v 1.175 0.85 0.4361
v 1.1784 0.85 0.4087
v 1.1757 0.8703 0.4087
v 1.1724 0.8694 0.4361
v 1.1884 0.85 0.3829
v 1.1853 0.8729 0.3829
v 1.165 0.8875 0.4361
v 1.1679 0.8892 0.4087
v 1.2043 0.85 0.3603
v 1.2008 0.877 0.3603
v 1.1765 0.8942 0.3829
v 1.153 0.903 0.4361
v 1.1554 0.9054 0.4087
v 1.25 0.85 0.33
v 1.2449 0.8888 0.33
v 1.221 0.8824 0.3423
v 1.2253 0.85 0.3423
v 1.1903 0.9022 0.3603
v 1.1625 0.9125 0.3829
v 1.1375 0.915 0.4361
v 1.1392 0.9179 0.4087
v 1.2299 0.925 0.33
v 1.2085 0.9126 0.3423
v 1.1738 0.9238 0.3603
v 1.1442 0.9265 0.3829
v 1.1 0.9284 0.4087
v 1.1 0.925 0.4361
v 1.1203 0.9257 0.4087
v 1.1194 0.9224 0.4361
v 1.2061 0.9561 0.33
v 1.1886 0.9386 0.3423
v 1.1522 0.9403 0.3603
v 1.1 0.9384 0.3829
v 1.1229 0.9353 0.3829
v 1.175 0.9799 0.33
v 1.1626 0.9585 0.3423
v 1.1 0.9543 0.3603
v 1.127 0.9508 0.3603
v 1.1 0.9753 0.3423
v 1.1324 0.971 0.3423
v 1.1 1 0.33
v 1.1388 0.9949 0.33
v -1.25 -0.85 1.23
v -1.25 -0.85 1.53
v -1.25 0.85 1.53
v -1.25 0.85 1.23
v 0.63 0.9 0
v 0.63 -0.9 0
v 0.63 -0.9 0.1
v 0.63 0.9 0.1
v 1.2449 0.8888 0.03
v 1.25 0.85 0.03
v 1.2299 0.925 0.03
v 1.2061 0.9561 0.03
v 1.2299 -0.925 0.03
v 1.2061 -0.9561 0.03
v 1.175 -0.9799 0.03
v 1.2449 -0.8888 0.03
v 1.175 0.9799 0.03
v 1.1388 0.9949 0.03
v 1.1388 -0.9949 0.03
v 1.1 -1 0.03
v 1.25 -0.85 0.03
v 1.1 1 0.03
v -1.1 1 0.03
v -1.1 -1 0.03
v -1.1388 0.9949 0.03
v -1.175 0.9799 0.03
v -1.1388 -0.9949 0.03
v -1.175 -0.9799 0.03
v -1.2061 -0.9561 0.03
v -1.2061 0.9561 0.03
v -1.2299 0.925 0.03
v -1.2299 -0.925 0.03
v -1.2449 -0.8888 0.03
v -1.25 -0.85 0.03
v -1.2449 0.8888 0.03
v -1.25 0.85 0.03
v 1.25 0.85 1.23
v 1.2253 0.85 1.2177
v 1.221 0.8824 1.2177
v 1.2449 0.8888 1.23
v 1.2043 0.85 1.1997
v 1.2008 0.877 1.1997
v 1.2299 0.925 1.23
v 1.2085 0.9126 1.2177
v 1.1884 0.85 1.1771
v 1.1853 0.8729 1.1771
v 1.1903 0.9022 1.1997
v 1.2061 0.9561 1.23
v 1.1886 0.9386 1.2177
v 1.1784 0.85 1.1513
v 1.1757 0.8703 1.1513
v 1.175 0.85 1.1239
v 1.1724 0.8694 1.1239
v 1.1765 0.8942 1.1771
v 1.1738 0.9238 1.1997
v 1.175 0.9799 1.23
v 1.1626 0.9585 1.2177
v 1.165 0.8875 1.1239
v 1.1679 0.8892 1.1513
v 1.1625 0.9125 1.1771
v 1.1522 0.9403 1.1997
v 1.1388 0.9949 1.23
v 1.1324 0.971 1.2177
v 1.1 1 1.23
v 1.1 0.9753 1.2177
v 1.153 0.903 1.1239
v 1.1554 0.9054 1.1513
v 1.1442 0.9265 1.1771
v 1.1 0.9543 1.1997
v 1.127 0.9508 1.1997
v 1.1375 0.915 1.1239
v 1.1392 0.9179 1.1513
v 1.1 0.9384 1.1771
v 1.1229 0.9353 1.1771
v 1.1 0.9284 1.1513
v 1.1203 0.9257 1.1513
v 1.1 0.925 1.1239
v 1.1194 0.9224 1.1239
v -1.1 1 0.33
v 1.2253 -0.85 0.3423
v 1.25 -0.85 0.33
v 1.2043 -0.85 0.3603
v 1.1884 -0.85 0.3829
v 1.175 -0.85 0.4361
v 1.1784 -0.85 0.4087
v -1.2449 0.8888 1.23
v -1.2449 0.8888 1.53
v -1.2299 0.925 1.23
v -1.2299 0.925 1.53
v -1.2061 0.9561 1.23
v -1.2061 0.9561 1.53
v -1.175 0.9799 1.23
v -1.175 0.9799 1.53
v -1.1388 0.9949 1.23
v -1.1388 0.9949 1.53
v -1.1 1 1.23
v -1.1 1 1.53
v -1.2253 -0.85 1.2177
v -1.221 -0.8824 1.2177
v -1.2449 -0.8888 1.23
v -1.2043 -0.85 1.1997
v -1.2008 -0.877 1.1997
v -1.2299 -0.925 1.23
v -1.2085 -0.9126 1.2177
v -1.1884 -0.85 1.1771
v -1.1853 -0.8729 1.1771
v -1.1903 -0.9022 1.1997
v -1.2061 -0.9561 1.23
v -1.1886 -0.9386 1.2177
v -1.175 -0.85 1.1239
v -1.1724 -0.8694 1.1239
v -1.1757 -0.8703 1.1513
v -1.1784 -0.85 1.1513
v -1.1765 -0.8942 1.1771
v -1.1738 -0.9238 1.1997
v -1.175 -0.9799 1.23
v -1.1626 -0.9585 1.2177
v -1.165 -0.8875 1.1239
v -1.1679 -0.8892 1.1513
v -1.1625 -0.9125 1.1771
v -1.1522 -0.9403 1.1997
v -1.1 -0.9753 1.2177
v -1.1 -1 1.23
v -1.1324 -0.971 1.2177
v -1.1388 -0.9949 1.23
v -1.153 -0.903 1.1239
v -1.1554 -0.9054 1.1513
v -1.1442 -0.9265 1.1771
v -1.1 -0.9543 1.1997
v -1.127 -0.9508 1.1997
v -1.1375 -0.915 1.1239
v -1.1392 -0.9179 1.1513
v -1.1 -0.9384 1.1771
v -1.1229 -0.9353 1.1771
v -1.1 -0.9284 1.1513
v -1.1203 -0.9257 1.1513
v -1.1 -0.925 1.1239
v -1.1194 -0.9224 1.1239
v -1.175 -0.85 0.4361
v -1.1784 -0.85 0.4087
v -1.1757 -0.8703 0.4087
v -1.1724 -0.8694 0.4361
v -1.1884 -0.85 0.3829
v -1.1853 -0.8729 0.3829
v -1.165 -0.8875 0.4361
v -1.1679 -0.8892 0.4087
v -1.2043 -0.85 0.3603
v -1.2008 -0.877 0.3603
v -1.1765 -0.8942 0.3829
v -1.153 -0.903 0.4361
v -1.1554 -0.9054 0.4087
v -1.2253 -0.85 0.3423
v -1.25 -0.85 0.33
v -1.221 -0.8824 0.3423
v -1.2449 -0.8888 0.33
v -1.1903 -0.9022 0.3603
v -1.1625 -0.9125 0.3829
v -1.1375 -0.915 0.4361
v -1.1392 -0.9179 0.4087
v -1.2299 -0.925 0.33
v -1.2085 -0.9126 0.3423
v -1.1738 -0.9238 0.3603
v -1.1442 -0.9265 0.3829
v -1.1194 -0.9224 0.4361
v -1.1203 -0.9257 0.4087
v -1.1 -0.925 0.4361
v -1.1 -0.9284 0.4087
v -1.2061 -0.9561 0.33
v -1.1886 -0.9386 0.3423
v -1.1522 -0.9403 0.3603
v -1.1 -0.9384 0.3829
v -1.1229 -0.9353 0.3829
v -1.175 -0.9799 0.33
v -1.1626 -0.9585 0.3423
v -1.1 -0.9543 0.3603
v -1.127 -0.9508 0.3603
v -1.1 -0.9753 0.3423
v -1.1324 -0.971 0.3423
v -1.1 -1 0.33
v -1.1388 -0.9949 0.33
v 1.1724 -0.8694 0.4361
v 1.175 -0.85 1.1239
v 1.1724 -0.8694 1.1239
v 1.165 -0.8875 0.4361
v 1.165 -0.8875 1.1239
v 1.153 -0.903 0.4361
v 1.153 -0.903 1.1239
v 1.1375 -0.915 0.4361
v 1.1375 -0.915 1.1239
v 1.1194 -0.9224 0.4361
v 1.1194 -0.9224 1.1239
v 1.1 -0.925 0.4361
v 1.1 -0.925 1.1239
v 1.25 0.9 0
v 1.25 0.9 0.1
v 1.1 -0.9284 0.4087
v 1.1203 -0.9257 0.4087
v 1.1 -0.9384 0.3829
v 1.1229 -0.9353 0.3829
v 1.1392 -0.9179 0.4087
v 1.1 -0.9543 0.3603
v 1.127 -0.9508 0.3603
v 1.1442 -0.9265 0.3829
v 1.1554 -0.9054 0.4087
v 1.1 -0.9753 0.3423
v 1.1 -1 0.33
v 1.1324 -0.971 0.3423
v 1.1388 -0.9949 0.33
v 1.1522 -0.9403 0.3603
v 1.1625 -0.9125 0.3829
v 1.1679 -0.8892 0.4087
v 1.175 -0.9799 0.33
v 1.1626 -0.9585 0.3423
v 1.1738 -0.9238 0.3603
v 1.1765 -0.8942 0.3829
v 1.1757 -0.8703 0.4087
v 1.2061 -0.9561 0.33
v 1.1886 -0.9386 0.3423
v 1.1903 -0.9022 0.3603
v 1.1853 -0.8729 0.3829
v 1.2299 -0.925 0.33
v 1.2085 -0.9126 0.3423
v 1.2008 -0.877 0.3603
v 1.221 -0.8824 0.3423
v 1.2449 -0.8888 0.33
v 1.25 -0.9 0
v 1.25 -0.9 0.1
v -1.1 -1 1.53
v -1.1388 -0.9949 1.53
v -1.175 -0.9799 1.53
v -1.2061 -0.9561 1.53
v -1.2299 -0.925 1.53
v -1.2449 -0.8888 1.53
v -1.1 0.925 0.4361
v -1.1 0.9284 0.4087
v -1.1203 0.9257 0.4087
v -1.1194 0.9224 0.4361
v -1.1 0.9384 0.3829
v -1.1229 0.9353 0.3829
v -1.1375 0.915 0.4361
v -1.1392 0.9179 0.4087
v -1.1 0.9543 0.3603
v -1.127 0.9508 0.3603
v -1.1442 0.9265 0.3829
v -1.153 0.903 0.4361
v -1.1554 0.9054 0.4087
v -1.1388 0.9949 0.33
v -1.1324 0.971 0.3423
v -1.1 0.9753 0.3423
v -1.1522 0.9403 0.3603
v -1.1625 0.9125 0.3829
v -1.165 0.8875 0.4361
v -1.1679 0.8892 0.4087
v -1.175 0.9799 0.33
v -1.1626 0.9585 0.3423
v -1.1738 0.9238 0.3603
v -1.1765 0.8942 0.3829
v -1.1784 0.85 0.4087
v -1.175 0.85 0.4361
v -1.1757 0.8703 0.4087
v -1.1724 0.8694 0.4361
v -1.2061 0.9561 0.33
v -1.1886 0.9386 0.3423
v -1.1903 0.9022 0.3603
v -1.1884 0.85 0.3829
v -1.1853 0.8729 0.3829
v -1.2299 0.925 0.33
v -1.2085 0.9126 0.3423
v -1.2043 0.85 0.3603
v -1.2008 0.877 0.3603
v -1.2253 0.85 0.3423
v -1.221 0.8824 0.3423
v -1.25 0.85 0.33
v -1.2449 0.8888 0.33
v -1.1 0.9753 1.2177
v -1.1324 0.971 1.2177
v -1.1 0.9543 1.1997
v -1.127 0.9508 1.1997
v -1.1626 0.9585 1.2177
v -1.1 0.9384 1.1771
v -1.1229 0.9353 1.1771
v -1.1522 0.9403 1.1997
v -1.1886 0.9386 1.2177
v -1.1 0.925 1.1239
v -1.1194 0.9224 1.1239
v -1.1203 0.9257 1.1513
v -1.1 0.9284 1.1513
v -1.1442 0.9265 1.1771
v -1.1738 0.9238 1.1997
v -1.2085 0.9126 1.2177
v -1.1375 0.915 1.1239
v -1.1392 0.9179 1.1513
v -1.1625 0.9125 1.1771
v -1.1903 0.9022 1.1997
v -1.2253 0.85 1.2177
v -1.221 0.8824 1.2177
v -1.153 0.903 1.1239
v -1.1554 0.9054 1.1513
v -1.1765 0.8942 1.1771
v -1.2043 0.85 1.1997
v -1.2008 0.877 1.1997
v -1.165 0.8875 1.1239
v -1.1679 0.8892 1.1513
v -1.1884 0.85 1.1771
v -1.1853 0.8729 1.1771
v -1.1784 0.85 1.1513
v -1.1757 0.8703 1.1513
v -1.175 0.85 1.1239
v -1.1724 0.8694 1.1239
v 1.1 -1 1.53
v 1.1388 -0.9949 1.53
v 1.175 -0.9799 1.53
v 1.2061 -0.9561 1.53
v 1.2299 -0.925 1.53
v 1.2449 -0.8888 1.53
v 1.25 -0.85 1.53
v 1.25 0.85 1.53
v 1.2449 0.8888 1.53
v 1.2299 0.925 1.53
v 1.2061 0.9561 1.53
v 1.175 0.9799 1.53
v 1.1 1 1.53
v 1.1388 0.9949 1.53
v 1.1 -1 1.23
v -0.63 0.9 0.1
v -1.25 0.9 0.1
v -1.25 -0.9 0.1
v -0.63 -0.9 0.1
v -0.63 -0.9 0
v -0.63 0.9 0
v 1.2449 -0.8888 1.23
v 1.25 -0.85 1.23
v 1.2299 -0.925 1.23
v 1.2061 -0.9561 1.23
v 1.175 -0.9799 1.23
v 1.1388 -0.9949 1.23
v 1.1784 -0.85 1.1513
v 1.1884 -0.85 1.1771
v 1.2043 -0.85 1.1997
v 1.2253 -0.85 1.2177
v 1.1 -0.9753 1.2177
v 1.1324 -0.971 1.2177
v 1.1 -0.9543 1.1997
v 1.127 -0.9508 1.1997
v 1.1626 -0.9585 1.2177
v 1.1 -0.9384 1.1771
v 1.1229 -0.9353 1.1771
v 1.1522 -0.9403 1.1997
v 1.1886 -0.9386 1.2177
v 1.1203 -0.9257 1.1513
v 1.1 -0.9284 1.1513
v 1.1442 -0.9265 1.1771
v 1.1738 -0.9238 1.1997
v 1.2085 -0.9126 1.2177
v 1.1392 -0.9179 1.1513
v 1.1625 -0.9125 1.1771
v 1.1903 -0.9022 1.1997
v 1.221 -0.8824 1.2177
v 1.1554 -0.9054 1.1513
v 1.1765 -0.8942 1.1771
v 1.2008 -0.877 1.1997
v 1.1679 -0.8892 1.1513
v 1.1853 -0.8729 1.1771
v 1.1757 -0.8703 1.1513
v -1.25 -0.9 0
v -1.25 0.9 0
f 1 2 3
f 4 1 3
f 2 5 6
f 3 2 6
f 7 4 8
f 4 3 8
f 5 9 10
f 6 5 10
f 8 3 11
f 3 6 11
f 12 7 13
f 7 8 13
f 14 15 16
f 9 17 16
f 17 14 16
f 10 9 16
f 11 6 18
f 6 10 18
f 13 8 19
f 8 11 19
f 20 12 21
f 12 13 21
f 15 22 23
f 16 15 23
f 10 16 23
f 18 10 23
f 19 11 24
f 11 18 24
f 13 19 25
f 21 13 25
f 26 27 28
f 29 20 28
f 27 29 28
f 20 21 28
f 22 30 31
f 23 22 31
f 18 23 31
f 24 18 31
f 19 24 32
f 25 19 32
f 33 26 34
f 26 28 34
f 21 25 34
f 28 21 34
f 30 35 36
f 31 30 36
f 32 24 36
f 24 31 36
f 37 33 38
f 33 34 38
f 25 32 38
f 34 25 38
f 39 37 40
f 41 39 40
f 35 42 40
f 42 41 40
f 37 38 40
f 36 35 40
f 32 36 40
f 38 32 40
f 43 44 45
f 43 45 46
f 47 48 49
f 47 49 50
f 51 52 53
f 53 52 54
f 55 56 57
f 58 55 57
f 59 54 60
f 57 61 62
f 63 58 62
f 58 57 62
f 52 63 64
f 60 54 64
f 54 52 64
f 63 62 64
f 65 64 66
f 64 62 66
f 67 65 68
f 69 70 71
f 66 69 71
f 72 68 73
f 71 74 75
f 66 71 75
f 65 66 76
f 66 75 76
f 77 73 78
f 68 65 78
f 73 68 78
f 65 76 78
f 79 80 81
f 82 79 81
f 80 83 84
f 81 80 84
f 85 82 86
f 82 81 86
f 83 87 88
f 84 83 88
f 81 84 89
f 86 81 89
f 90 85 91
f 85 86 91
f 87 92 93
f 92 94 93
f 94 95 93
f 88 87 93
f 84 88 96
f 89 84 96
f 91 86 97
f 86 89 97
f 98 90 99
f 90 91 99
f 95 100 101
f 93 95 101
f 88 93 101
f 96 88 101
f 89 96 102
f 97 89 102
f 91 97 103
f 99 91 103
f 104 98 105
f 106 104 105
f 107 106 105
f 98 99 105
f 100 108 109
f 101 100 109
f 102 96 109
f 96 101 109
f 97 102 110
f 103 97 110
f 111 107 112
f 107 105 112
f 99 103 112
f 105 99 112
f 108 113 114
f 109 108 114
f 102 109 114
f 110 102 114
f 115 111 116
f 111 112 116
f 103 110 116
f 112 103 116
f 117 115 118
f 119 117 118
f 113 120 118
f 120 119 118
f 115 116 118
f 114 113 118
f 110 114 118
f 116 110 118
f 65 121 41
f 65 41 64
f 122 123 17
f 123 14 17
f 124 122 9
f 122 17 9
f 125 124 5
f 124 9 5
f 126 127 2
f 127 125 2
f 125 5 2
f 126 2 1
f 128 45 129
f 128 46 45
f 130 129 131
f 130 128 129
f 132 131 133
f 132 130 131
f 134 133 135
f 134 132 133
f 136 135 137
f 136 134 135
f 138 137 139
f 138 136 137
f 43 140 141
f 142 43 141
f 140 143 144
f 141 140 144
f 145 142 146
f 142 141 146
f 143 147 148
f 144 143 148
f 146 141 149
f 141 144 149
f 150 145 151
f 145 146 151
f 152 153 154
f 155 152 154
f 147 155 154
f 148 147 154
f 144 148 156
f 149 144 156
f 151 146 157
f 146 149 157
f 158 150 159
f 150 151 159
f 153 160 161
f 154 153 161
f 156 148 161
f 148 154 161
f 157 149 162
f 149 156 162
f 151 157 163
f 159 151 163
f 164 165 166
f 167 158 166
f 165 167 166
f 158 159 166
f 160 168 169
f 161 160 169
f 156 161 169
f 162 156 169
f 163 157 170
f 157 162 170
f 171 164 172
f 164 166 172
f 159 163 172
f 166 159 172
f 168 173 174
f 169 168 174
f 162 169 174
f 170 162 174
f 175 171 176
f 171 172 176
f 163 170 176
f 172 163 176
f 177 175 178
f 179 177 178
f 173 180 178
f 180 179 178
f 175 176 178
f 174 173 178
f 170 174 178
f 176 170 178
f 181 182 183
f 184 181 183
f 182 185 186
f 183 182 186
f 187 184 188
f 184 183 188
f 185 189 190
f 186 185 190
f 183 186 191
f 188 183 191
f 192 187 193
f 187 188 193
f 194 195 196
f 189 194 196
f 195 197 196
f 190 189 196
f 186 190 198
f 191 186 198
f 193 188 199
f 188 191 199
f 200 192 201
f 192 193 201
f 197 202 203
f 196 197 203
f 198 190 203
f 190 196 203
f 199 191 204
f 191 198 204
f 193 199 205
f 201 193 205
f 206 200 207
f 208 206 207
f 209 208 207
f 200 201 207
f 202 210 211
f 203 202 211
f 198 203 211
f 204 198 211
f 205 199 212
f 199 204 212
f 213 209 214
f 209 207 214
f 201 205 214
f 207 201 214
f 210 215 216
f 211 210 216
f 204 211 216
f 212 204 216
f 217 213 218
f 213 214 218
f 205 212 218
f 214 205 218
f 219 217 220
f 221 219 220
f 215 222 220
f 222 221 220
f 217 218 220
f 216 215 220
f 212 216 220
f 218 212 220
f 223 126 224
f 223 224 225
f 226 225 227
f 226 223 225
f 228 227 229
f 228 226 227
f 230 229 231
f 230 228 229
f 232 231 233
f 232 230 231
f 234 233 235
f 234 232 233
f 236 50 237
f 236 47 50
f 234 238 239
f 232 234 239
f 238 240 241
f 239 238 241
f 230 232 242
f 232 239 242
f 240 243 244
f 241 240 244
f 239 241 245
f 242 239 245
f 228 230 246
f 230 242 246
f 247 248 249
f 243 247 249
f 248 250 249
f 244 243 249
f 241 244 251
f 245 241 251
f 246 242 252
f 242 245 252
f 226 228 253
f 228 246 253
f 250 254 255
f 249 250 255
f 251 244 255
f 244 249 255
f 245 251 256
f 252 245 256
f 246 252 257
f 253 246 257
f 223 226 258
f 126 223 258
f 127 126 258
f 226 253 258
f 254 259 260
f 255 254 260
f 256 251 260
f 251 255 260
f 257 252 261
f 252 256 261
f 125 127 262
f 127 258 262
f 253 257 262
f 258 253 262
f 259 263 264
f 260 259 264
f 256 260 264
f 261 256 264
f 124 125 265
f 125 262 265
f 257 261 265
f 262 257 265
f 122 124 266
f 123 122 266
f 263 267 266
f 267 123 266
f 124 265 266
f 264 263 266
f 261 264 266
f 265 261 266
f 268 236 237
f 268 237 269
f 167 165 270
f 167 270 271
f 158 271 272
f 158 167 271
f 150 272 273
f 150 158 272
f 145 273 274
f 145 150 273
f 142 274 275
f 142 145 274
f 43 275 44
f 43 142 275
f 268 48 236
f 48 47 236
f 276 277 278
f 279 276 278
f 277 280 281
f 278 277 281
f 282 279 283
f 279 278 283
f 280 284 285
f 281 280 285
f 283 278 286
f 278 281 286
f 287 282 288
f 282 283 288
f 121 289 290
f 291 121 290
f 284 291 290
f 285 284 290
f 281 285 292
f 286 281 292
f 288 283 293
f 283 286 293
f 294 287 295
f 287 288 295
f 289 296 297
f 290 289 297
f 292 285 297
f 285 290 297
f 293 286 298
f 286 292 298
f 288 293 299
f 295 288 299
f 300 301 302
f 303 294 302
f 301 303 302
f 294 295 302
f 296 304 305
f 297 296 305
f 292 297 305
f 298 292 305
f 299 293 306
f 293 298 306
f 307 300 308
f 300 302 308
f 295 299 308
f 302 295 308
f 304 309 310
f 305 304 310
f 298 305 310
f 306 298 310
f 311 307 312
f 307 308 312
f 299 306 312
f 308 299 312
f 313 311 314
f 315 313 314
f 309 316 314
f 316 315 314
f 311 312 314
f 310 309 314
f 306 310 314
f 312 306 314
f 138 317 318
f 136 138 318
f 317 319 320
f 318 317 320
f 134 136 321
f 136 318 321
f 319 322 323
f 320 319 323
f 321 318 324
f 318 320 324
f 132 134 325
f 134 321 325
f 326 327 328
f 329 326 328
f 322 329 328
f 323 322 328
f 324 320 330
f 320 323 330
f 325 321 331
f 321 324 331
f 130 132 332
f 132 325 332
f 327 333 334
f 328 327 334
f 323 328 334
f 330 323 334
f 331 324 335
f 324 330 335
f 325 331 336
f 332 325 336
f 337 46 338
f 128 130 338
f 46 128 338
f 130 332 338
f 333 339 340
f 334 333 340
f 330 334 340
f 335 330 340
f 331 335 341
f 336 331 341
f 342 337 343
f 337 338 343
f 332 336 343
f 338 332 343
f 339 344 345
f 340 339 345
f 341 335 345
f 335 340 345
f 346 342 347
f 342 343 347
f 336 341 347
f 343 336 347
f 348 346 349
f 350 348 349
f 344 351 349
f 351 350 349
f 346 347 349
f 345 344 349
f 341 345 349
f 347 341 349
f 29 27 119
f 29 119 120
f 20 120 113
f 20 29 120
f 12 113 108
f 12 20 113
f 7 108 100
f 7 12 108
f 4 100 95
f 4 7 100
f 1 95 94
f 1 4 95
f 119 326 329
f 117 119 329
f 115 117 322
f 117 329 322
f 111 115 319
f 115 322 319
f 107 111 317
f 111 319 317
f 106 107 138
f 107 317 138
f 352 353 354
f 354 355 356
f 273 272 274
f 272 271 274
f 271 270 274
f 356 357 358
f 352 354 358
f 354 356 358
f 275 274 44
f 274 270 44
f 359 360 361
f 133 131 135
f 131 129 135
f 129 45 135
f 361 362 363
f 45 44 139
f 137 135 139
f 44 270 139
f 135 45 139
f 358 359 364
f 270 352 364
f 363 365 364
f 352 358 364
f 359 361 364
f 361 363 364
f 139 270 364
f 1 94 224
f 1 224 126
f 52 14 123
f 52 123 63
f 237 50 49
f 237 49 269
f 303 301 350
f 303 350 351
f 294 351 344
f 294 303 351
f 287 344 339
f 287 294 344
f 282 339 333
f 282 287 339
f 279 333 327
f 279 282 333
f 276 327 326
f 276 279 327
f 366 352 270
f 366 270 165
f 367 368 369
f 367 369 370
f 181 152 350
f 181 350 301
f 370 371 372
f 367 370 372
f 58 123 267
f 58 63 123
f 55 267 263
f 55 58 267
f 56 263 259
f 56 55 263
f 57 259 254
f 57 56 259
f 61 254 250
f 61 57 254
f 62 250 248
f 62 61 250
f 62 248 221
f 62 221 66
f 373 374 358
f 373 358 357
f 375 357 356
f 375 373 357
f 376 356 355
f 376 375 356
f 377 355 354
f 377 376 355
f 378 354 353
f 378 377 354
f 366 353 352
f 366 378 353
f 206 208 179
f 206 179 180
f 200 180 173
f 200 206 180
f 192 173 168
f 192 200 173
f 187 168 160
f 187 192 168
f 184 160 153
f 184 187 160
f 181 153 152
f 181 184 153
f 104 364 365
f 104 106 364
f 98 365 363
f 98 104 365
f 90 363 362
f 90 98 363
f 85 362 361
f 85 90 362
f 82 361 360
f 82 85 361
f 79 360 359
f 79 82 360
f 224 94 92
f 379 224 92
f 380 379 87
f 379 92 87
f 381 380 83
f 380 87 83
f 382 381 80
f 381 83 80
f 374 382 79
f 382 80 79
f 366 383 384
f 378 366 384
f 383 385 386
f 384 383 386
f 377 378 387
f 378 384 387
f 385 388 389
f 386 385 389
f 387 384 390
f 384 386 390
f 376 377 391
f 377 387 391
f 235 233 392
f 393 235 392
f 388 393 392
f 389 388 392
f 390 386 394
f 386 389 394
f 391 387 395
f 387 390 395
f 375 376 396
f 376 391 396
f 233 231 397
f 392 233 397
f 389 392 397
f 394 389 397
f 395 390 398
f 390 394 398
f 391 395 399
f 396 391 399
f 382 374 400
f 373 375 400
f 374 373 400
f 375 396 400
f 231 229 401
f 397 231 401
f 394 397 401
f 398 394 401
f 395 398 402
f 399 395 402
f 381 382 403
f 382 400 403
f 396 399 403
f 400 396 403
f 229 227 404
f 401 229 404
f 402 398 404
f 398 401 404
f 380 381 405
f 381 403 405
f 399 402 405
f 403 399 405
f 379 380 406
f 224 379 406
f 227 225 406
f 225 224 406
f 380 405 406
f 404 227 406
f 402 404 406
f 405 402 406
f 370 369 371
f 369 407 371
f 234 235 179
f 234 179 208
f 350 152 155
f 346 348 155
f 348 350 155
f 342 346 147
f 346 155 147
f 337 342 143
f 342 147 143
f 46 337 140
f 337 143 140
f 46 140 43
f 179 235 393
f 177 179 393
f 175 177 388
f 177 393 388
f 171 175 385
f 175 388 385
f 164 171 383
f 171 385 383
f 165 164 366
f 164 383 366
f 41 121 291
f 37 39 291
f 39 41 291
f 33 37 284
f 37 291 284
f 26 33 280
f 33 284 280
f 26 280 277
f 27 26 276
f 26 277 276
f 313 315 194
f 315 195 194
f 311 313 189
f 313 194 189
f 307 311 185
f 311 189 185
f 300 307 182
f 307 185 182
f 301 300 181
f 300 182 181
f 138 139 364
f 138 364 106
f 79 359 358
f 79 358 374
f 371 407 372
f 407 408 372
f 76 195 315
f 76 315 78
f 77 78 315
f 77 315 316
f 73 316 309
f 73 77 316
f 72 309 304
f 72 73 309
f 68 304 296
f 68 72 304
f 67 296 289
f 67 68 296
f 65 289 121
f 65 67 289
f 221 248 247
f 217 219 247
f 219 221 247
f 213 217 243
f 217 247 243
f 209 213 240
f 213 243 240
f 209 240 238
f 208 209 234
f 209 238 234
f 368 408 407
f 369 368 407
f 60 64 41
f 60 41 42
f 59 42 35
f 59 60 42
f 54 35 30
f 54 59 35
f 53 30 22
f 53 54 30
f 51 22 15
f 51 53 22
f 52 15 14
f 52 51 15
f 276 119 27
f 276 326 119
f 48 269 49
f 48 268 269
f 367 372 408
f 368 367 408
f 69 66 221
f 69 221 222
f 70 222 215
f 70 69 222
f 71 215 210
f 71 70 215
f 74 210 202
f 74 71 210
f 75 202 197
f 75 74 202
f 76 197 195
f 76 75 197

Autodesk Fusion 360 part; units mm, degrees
ref_plane "WorkPlane3" through (0, 0, 0.03) normal (0, 0, 1) x (1, 0, 0)
sketch "Sketch1" plane through (0, 0, 0.03) normal (0, 0, 1) x (1, 0, 0)
  line L0 (1.1, 1) -> (-1.1, 1)
  line L1 (-1.25, 0.85) -> (-1.25, -0.85)
  line L2 (-1.1, -1) -> (1.1, -1)
  line L3 (1.25, -0.85) -> (1.25, 0.85)
  line L4 (1.25, 1) -> (-1.25, -1) construction
  line L5 (-1.25, 1) -> (1.25, -1) construction
  line L6 (0, 1) -> (0, -1) construction
  arc A0 (-1.25, -0.85) -> (-1.1, -1) centre (-1.1, -0.85) ccw
  arc A1 (1.1, -1) -> (1.25, -0.85) centre (1.1, -0.85) ccw
  arc A2 (1.25, 0.85) -> (1.1, 1) centre (1.1, 0.85) ccw
  arc A3 (-1.1, 1) -> (-1.25, 0.85) centre (-1.1, 0.85) ccw
  point P0 (1.05, 0)
  dimension "d10" = 2.5
  dimension "d11" = 2
  dimension "d30" = 0.15
ref_plane "WorkPlane2" through (1.1, 0, 0) normal (1, 0, 0) x (0, 1, 0)
sketch "Sketch2" plane through (1.1, 0, 0) normal (1, 0, 0) x (0, 1, 0)
  line L0 (0, 0.03) -> (0, 1.53)
  line L1 (0, 1.53) -> (-1, 1.53)
  line L2 (-1, 1.53) -> (-1, 1.23)
  arc A0 (-0.925, 1.1239) -> (-1, 1.23) centre (-1.0375, 1.1239) ccw
  line L3 (-0.925, 1.1239) -> (-0.925, 0.4361)
  line L4 (-1, 0.03) -> (-1, 0.33)
  arc A1 (-1, 0.33) -> (-0.925, 0.4361) centre (-1.0375, 0.4361) ccw
  line L5 (-0.85, 1.53) -> (-0.85, 0.03)
  line L6 (0, 0.03) -> (-1, 0.03)
  point P0 (-0.85, 0.03)
  dimension "d22" = 0.075
  dimension "d23" = 0.3
  dimension "d24" = 0.3
  dimension "d26" = 0.1125
  dimension "d44" = 1.5
  dimension "d45" = 1
sweep "Sweep1" add profiles "Sketch2" path "Sketch1" along A2 L0 A3 L1 A0 L2 A1 L3 section 1 contours L1 L2 A0 L3 L4 A1 L5 L6 makes body 1
sketch "Sketch3" plane through (0, 0, 1.53) normal (0, 0, 1) x (-1, 0, 0)
  line L0 (-1.1, 0.85) -> (1.1, 0.85)
  line L1 (1.1, 0.85) -> (1.1, -0.85)
  line L2 (1.1, -0.85) -> (-1.1, -0.85)
  line L3 (-1.1, -0.85) -> (-1.1, 0.85)
  arc A0 (-1.1, 1) -> (-1.25, 0.85) centre (-1.1, 0.85) ccw
  line L4 (-1.25, 0.85) -> (-1.25, -0.85)
  arc A1 (-1.25, -0.85) -> (-1.1, -1) centre (-1.1, -0.85) ccw
  line L5 (-1.1, -1) -> (1.1, -1)
  arc A2 (1.1, -1) -> (1.25, -0.85) centre (1.1, -0.85) ccw
  line L6 (1.25, -0.85) -> (1.25, 0.85)
  arc A3 (1.25, 0.85) -> (1.1, 1) centre (1.1, 0.85) ccw
  line L7 (1.1, 1) -> (-1.1, 1)
extrude "Extrude4" add sketch "Sketch3" against normal blind 1.5 contours L0 L1 L2 L3 bodies 1
sketch "Sketch4" plane through (0, 0, 0) normal (0, 0, 1) x (1, 0, 0)
  line L0 (-0.63, 0.9) -> (-1.25, 0.9)
  line L1 (-1.25, 0.9) -> (-1.25, -0.9)
  line L2 (-1.25, -0.9) -> (-0.63, -0.9)
  line L3 (-0.63, -0.9) -> (-0.63, 0.9)
  line L4 (-0.63, 0.9) -> (-1.25, -0.9) construction
  line L5 (-1.25, 0.9) -> (-0.63, -0.9) construction
  line L6 (0, 0) -> (0, 1.8014) construction
  line L7 (0.63, -0.9) -> (0.63, 0.9)
  line L8 (0.63, 0.9) -> (1.25, 0.9)
  line L9 (1.25, 0.9) -> (1.25, -0.9)
  line L10 (1.25, -0.9) -> (0.63, -0.9)
  point P0 (-0.94, 0)
  dimension "d48" = 1.8
  dimension "d50" = 0.63
  dimension "d51" = 1.25
extrude "Extrude5" add sketch "Sketch4" along normal blind 0.1 separate body makes body 2 at (-1.0433, 0.3, 0) makes body 3 at (1.0433, 0.3, 0)
equation "ind2520_package_length = 2.5 mm" comment "2.4 - 2.8"
equation "ind2520_package_width = 2 mm" comment "1.5 - 1.9"
equation "ind2520_package_height = 1.5 mm" comment "0.9 - 1.1"
equation "ind2520_above_board = 0.03 mm"
equation "ind2520_lead_thick = 0.1 mm" comment "0.1 - 0.22"
equation "ind2520_lead_width = ind2520_package_width - 0.2 mm" comment "0.75 - 1.05"
equation "ind2520_lead_extension = 0 mm" comment "0.3 - 0.6"
equation "d10 = ind2520_package_length"
equation "d11 = ind2520_package_width"
equation "d26 = d22 * 3 / 2"
equation "d33 = ind2520_package_length / 2 - d30"
equation "d44 = ind2520_package_height"
equation "d45 = ind2520_package_width / 2"
equation "d46 = ind2520_above_board"
equation "d47 = -ind2520_package_height"
equation "d48 = ind2520_lead_width"
equation "ind2520_lead_length = 0.62 mm"
equation "d50 = ind2520_package_length / 2 - ind2520_lead_length"
equation "d51 = ind2520_package_length / 2 + ind2520_lead_extension"
equation "d52 = ind2520_lead_thick"
